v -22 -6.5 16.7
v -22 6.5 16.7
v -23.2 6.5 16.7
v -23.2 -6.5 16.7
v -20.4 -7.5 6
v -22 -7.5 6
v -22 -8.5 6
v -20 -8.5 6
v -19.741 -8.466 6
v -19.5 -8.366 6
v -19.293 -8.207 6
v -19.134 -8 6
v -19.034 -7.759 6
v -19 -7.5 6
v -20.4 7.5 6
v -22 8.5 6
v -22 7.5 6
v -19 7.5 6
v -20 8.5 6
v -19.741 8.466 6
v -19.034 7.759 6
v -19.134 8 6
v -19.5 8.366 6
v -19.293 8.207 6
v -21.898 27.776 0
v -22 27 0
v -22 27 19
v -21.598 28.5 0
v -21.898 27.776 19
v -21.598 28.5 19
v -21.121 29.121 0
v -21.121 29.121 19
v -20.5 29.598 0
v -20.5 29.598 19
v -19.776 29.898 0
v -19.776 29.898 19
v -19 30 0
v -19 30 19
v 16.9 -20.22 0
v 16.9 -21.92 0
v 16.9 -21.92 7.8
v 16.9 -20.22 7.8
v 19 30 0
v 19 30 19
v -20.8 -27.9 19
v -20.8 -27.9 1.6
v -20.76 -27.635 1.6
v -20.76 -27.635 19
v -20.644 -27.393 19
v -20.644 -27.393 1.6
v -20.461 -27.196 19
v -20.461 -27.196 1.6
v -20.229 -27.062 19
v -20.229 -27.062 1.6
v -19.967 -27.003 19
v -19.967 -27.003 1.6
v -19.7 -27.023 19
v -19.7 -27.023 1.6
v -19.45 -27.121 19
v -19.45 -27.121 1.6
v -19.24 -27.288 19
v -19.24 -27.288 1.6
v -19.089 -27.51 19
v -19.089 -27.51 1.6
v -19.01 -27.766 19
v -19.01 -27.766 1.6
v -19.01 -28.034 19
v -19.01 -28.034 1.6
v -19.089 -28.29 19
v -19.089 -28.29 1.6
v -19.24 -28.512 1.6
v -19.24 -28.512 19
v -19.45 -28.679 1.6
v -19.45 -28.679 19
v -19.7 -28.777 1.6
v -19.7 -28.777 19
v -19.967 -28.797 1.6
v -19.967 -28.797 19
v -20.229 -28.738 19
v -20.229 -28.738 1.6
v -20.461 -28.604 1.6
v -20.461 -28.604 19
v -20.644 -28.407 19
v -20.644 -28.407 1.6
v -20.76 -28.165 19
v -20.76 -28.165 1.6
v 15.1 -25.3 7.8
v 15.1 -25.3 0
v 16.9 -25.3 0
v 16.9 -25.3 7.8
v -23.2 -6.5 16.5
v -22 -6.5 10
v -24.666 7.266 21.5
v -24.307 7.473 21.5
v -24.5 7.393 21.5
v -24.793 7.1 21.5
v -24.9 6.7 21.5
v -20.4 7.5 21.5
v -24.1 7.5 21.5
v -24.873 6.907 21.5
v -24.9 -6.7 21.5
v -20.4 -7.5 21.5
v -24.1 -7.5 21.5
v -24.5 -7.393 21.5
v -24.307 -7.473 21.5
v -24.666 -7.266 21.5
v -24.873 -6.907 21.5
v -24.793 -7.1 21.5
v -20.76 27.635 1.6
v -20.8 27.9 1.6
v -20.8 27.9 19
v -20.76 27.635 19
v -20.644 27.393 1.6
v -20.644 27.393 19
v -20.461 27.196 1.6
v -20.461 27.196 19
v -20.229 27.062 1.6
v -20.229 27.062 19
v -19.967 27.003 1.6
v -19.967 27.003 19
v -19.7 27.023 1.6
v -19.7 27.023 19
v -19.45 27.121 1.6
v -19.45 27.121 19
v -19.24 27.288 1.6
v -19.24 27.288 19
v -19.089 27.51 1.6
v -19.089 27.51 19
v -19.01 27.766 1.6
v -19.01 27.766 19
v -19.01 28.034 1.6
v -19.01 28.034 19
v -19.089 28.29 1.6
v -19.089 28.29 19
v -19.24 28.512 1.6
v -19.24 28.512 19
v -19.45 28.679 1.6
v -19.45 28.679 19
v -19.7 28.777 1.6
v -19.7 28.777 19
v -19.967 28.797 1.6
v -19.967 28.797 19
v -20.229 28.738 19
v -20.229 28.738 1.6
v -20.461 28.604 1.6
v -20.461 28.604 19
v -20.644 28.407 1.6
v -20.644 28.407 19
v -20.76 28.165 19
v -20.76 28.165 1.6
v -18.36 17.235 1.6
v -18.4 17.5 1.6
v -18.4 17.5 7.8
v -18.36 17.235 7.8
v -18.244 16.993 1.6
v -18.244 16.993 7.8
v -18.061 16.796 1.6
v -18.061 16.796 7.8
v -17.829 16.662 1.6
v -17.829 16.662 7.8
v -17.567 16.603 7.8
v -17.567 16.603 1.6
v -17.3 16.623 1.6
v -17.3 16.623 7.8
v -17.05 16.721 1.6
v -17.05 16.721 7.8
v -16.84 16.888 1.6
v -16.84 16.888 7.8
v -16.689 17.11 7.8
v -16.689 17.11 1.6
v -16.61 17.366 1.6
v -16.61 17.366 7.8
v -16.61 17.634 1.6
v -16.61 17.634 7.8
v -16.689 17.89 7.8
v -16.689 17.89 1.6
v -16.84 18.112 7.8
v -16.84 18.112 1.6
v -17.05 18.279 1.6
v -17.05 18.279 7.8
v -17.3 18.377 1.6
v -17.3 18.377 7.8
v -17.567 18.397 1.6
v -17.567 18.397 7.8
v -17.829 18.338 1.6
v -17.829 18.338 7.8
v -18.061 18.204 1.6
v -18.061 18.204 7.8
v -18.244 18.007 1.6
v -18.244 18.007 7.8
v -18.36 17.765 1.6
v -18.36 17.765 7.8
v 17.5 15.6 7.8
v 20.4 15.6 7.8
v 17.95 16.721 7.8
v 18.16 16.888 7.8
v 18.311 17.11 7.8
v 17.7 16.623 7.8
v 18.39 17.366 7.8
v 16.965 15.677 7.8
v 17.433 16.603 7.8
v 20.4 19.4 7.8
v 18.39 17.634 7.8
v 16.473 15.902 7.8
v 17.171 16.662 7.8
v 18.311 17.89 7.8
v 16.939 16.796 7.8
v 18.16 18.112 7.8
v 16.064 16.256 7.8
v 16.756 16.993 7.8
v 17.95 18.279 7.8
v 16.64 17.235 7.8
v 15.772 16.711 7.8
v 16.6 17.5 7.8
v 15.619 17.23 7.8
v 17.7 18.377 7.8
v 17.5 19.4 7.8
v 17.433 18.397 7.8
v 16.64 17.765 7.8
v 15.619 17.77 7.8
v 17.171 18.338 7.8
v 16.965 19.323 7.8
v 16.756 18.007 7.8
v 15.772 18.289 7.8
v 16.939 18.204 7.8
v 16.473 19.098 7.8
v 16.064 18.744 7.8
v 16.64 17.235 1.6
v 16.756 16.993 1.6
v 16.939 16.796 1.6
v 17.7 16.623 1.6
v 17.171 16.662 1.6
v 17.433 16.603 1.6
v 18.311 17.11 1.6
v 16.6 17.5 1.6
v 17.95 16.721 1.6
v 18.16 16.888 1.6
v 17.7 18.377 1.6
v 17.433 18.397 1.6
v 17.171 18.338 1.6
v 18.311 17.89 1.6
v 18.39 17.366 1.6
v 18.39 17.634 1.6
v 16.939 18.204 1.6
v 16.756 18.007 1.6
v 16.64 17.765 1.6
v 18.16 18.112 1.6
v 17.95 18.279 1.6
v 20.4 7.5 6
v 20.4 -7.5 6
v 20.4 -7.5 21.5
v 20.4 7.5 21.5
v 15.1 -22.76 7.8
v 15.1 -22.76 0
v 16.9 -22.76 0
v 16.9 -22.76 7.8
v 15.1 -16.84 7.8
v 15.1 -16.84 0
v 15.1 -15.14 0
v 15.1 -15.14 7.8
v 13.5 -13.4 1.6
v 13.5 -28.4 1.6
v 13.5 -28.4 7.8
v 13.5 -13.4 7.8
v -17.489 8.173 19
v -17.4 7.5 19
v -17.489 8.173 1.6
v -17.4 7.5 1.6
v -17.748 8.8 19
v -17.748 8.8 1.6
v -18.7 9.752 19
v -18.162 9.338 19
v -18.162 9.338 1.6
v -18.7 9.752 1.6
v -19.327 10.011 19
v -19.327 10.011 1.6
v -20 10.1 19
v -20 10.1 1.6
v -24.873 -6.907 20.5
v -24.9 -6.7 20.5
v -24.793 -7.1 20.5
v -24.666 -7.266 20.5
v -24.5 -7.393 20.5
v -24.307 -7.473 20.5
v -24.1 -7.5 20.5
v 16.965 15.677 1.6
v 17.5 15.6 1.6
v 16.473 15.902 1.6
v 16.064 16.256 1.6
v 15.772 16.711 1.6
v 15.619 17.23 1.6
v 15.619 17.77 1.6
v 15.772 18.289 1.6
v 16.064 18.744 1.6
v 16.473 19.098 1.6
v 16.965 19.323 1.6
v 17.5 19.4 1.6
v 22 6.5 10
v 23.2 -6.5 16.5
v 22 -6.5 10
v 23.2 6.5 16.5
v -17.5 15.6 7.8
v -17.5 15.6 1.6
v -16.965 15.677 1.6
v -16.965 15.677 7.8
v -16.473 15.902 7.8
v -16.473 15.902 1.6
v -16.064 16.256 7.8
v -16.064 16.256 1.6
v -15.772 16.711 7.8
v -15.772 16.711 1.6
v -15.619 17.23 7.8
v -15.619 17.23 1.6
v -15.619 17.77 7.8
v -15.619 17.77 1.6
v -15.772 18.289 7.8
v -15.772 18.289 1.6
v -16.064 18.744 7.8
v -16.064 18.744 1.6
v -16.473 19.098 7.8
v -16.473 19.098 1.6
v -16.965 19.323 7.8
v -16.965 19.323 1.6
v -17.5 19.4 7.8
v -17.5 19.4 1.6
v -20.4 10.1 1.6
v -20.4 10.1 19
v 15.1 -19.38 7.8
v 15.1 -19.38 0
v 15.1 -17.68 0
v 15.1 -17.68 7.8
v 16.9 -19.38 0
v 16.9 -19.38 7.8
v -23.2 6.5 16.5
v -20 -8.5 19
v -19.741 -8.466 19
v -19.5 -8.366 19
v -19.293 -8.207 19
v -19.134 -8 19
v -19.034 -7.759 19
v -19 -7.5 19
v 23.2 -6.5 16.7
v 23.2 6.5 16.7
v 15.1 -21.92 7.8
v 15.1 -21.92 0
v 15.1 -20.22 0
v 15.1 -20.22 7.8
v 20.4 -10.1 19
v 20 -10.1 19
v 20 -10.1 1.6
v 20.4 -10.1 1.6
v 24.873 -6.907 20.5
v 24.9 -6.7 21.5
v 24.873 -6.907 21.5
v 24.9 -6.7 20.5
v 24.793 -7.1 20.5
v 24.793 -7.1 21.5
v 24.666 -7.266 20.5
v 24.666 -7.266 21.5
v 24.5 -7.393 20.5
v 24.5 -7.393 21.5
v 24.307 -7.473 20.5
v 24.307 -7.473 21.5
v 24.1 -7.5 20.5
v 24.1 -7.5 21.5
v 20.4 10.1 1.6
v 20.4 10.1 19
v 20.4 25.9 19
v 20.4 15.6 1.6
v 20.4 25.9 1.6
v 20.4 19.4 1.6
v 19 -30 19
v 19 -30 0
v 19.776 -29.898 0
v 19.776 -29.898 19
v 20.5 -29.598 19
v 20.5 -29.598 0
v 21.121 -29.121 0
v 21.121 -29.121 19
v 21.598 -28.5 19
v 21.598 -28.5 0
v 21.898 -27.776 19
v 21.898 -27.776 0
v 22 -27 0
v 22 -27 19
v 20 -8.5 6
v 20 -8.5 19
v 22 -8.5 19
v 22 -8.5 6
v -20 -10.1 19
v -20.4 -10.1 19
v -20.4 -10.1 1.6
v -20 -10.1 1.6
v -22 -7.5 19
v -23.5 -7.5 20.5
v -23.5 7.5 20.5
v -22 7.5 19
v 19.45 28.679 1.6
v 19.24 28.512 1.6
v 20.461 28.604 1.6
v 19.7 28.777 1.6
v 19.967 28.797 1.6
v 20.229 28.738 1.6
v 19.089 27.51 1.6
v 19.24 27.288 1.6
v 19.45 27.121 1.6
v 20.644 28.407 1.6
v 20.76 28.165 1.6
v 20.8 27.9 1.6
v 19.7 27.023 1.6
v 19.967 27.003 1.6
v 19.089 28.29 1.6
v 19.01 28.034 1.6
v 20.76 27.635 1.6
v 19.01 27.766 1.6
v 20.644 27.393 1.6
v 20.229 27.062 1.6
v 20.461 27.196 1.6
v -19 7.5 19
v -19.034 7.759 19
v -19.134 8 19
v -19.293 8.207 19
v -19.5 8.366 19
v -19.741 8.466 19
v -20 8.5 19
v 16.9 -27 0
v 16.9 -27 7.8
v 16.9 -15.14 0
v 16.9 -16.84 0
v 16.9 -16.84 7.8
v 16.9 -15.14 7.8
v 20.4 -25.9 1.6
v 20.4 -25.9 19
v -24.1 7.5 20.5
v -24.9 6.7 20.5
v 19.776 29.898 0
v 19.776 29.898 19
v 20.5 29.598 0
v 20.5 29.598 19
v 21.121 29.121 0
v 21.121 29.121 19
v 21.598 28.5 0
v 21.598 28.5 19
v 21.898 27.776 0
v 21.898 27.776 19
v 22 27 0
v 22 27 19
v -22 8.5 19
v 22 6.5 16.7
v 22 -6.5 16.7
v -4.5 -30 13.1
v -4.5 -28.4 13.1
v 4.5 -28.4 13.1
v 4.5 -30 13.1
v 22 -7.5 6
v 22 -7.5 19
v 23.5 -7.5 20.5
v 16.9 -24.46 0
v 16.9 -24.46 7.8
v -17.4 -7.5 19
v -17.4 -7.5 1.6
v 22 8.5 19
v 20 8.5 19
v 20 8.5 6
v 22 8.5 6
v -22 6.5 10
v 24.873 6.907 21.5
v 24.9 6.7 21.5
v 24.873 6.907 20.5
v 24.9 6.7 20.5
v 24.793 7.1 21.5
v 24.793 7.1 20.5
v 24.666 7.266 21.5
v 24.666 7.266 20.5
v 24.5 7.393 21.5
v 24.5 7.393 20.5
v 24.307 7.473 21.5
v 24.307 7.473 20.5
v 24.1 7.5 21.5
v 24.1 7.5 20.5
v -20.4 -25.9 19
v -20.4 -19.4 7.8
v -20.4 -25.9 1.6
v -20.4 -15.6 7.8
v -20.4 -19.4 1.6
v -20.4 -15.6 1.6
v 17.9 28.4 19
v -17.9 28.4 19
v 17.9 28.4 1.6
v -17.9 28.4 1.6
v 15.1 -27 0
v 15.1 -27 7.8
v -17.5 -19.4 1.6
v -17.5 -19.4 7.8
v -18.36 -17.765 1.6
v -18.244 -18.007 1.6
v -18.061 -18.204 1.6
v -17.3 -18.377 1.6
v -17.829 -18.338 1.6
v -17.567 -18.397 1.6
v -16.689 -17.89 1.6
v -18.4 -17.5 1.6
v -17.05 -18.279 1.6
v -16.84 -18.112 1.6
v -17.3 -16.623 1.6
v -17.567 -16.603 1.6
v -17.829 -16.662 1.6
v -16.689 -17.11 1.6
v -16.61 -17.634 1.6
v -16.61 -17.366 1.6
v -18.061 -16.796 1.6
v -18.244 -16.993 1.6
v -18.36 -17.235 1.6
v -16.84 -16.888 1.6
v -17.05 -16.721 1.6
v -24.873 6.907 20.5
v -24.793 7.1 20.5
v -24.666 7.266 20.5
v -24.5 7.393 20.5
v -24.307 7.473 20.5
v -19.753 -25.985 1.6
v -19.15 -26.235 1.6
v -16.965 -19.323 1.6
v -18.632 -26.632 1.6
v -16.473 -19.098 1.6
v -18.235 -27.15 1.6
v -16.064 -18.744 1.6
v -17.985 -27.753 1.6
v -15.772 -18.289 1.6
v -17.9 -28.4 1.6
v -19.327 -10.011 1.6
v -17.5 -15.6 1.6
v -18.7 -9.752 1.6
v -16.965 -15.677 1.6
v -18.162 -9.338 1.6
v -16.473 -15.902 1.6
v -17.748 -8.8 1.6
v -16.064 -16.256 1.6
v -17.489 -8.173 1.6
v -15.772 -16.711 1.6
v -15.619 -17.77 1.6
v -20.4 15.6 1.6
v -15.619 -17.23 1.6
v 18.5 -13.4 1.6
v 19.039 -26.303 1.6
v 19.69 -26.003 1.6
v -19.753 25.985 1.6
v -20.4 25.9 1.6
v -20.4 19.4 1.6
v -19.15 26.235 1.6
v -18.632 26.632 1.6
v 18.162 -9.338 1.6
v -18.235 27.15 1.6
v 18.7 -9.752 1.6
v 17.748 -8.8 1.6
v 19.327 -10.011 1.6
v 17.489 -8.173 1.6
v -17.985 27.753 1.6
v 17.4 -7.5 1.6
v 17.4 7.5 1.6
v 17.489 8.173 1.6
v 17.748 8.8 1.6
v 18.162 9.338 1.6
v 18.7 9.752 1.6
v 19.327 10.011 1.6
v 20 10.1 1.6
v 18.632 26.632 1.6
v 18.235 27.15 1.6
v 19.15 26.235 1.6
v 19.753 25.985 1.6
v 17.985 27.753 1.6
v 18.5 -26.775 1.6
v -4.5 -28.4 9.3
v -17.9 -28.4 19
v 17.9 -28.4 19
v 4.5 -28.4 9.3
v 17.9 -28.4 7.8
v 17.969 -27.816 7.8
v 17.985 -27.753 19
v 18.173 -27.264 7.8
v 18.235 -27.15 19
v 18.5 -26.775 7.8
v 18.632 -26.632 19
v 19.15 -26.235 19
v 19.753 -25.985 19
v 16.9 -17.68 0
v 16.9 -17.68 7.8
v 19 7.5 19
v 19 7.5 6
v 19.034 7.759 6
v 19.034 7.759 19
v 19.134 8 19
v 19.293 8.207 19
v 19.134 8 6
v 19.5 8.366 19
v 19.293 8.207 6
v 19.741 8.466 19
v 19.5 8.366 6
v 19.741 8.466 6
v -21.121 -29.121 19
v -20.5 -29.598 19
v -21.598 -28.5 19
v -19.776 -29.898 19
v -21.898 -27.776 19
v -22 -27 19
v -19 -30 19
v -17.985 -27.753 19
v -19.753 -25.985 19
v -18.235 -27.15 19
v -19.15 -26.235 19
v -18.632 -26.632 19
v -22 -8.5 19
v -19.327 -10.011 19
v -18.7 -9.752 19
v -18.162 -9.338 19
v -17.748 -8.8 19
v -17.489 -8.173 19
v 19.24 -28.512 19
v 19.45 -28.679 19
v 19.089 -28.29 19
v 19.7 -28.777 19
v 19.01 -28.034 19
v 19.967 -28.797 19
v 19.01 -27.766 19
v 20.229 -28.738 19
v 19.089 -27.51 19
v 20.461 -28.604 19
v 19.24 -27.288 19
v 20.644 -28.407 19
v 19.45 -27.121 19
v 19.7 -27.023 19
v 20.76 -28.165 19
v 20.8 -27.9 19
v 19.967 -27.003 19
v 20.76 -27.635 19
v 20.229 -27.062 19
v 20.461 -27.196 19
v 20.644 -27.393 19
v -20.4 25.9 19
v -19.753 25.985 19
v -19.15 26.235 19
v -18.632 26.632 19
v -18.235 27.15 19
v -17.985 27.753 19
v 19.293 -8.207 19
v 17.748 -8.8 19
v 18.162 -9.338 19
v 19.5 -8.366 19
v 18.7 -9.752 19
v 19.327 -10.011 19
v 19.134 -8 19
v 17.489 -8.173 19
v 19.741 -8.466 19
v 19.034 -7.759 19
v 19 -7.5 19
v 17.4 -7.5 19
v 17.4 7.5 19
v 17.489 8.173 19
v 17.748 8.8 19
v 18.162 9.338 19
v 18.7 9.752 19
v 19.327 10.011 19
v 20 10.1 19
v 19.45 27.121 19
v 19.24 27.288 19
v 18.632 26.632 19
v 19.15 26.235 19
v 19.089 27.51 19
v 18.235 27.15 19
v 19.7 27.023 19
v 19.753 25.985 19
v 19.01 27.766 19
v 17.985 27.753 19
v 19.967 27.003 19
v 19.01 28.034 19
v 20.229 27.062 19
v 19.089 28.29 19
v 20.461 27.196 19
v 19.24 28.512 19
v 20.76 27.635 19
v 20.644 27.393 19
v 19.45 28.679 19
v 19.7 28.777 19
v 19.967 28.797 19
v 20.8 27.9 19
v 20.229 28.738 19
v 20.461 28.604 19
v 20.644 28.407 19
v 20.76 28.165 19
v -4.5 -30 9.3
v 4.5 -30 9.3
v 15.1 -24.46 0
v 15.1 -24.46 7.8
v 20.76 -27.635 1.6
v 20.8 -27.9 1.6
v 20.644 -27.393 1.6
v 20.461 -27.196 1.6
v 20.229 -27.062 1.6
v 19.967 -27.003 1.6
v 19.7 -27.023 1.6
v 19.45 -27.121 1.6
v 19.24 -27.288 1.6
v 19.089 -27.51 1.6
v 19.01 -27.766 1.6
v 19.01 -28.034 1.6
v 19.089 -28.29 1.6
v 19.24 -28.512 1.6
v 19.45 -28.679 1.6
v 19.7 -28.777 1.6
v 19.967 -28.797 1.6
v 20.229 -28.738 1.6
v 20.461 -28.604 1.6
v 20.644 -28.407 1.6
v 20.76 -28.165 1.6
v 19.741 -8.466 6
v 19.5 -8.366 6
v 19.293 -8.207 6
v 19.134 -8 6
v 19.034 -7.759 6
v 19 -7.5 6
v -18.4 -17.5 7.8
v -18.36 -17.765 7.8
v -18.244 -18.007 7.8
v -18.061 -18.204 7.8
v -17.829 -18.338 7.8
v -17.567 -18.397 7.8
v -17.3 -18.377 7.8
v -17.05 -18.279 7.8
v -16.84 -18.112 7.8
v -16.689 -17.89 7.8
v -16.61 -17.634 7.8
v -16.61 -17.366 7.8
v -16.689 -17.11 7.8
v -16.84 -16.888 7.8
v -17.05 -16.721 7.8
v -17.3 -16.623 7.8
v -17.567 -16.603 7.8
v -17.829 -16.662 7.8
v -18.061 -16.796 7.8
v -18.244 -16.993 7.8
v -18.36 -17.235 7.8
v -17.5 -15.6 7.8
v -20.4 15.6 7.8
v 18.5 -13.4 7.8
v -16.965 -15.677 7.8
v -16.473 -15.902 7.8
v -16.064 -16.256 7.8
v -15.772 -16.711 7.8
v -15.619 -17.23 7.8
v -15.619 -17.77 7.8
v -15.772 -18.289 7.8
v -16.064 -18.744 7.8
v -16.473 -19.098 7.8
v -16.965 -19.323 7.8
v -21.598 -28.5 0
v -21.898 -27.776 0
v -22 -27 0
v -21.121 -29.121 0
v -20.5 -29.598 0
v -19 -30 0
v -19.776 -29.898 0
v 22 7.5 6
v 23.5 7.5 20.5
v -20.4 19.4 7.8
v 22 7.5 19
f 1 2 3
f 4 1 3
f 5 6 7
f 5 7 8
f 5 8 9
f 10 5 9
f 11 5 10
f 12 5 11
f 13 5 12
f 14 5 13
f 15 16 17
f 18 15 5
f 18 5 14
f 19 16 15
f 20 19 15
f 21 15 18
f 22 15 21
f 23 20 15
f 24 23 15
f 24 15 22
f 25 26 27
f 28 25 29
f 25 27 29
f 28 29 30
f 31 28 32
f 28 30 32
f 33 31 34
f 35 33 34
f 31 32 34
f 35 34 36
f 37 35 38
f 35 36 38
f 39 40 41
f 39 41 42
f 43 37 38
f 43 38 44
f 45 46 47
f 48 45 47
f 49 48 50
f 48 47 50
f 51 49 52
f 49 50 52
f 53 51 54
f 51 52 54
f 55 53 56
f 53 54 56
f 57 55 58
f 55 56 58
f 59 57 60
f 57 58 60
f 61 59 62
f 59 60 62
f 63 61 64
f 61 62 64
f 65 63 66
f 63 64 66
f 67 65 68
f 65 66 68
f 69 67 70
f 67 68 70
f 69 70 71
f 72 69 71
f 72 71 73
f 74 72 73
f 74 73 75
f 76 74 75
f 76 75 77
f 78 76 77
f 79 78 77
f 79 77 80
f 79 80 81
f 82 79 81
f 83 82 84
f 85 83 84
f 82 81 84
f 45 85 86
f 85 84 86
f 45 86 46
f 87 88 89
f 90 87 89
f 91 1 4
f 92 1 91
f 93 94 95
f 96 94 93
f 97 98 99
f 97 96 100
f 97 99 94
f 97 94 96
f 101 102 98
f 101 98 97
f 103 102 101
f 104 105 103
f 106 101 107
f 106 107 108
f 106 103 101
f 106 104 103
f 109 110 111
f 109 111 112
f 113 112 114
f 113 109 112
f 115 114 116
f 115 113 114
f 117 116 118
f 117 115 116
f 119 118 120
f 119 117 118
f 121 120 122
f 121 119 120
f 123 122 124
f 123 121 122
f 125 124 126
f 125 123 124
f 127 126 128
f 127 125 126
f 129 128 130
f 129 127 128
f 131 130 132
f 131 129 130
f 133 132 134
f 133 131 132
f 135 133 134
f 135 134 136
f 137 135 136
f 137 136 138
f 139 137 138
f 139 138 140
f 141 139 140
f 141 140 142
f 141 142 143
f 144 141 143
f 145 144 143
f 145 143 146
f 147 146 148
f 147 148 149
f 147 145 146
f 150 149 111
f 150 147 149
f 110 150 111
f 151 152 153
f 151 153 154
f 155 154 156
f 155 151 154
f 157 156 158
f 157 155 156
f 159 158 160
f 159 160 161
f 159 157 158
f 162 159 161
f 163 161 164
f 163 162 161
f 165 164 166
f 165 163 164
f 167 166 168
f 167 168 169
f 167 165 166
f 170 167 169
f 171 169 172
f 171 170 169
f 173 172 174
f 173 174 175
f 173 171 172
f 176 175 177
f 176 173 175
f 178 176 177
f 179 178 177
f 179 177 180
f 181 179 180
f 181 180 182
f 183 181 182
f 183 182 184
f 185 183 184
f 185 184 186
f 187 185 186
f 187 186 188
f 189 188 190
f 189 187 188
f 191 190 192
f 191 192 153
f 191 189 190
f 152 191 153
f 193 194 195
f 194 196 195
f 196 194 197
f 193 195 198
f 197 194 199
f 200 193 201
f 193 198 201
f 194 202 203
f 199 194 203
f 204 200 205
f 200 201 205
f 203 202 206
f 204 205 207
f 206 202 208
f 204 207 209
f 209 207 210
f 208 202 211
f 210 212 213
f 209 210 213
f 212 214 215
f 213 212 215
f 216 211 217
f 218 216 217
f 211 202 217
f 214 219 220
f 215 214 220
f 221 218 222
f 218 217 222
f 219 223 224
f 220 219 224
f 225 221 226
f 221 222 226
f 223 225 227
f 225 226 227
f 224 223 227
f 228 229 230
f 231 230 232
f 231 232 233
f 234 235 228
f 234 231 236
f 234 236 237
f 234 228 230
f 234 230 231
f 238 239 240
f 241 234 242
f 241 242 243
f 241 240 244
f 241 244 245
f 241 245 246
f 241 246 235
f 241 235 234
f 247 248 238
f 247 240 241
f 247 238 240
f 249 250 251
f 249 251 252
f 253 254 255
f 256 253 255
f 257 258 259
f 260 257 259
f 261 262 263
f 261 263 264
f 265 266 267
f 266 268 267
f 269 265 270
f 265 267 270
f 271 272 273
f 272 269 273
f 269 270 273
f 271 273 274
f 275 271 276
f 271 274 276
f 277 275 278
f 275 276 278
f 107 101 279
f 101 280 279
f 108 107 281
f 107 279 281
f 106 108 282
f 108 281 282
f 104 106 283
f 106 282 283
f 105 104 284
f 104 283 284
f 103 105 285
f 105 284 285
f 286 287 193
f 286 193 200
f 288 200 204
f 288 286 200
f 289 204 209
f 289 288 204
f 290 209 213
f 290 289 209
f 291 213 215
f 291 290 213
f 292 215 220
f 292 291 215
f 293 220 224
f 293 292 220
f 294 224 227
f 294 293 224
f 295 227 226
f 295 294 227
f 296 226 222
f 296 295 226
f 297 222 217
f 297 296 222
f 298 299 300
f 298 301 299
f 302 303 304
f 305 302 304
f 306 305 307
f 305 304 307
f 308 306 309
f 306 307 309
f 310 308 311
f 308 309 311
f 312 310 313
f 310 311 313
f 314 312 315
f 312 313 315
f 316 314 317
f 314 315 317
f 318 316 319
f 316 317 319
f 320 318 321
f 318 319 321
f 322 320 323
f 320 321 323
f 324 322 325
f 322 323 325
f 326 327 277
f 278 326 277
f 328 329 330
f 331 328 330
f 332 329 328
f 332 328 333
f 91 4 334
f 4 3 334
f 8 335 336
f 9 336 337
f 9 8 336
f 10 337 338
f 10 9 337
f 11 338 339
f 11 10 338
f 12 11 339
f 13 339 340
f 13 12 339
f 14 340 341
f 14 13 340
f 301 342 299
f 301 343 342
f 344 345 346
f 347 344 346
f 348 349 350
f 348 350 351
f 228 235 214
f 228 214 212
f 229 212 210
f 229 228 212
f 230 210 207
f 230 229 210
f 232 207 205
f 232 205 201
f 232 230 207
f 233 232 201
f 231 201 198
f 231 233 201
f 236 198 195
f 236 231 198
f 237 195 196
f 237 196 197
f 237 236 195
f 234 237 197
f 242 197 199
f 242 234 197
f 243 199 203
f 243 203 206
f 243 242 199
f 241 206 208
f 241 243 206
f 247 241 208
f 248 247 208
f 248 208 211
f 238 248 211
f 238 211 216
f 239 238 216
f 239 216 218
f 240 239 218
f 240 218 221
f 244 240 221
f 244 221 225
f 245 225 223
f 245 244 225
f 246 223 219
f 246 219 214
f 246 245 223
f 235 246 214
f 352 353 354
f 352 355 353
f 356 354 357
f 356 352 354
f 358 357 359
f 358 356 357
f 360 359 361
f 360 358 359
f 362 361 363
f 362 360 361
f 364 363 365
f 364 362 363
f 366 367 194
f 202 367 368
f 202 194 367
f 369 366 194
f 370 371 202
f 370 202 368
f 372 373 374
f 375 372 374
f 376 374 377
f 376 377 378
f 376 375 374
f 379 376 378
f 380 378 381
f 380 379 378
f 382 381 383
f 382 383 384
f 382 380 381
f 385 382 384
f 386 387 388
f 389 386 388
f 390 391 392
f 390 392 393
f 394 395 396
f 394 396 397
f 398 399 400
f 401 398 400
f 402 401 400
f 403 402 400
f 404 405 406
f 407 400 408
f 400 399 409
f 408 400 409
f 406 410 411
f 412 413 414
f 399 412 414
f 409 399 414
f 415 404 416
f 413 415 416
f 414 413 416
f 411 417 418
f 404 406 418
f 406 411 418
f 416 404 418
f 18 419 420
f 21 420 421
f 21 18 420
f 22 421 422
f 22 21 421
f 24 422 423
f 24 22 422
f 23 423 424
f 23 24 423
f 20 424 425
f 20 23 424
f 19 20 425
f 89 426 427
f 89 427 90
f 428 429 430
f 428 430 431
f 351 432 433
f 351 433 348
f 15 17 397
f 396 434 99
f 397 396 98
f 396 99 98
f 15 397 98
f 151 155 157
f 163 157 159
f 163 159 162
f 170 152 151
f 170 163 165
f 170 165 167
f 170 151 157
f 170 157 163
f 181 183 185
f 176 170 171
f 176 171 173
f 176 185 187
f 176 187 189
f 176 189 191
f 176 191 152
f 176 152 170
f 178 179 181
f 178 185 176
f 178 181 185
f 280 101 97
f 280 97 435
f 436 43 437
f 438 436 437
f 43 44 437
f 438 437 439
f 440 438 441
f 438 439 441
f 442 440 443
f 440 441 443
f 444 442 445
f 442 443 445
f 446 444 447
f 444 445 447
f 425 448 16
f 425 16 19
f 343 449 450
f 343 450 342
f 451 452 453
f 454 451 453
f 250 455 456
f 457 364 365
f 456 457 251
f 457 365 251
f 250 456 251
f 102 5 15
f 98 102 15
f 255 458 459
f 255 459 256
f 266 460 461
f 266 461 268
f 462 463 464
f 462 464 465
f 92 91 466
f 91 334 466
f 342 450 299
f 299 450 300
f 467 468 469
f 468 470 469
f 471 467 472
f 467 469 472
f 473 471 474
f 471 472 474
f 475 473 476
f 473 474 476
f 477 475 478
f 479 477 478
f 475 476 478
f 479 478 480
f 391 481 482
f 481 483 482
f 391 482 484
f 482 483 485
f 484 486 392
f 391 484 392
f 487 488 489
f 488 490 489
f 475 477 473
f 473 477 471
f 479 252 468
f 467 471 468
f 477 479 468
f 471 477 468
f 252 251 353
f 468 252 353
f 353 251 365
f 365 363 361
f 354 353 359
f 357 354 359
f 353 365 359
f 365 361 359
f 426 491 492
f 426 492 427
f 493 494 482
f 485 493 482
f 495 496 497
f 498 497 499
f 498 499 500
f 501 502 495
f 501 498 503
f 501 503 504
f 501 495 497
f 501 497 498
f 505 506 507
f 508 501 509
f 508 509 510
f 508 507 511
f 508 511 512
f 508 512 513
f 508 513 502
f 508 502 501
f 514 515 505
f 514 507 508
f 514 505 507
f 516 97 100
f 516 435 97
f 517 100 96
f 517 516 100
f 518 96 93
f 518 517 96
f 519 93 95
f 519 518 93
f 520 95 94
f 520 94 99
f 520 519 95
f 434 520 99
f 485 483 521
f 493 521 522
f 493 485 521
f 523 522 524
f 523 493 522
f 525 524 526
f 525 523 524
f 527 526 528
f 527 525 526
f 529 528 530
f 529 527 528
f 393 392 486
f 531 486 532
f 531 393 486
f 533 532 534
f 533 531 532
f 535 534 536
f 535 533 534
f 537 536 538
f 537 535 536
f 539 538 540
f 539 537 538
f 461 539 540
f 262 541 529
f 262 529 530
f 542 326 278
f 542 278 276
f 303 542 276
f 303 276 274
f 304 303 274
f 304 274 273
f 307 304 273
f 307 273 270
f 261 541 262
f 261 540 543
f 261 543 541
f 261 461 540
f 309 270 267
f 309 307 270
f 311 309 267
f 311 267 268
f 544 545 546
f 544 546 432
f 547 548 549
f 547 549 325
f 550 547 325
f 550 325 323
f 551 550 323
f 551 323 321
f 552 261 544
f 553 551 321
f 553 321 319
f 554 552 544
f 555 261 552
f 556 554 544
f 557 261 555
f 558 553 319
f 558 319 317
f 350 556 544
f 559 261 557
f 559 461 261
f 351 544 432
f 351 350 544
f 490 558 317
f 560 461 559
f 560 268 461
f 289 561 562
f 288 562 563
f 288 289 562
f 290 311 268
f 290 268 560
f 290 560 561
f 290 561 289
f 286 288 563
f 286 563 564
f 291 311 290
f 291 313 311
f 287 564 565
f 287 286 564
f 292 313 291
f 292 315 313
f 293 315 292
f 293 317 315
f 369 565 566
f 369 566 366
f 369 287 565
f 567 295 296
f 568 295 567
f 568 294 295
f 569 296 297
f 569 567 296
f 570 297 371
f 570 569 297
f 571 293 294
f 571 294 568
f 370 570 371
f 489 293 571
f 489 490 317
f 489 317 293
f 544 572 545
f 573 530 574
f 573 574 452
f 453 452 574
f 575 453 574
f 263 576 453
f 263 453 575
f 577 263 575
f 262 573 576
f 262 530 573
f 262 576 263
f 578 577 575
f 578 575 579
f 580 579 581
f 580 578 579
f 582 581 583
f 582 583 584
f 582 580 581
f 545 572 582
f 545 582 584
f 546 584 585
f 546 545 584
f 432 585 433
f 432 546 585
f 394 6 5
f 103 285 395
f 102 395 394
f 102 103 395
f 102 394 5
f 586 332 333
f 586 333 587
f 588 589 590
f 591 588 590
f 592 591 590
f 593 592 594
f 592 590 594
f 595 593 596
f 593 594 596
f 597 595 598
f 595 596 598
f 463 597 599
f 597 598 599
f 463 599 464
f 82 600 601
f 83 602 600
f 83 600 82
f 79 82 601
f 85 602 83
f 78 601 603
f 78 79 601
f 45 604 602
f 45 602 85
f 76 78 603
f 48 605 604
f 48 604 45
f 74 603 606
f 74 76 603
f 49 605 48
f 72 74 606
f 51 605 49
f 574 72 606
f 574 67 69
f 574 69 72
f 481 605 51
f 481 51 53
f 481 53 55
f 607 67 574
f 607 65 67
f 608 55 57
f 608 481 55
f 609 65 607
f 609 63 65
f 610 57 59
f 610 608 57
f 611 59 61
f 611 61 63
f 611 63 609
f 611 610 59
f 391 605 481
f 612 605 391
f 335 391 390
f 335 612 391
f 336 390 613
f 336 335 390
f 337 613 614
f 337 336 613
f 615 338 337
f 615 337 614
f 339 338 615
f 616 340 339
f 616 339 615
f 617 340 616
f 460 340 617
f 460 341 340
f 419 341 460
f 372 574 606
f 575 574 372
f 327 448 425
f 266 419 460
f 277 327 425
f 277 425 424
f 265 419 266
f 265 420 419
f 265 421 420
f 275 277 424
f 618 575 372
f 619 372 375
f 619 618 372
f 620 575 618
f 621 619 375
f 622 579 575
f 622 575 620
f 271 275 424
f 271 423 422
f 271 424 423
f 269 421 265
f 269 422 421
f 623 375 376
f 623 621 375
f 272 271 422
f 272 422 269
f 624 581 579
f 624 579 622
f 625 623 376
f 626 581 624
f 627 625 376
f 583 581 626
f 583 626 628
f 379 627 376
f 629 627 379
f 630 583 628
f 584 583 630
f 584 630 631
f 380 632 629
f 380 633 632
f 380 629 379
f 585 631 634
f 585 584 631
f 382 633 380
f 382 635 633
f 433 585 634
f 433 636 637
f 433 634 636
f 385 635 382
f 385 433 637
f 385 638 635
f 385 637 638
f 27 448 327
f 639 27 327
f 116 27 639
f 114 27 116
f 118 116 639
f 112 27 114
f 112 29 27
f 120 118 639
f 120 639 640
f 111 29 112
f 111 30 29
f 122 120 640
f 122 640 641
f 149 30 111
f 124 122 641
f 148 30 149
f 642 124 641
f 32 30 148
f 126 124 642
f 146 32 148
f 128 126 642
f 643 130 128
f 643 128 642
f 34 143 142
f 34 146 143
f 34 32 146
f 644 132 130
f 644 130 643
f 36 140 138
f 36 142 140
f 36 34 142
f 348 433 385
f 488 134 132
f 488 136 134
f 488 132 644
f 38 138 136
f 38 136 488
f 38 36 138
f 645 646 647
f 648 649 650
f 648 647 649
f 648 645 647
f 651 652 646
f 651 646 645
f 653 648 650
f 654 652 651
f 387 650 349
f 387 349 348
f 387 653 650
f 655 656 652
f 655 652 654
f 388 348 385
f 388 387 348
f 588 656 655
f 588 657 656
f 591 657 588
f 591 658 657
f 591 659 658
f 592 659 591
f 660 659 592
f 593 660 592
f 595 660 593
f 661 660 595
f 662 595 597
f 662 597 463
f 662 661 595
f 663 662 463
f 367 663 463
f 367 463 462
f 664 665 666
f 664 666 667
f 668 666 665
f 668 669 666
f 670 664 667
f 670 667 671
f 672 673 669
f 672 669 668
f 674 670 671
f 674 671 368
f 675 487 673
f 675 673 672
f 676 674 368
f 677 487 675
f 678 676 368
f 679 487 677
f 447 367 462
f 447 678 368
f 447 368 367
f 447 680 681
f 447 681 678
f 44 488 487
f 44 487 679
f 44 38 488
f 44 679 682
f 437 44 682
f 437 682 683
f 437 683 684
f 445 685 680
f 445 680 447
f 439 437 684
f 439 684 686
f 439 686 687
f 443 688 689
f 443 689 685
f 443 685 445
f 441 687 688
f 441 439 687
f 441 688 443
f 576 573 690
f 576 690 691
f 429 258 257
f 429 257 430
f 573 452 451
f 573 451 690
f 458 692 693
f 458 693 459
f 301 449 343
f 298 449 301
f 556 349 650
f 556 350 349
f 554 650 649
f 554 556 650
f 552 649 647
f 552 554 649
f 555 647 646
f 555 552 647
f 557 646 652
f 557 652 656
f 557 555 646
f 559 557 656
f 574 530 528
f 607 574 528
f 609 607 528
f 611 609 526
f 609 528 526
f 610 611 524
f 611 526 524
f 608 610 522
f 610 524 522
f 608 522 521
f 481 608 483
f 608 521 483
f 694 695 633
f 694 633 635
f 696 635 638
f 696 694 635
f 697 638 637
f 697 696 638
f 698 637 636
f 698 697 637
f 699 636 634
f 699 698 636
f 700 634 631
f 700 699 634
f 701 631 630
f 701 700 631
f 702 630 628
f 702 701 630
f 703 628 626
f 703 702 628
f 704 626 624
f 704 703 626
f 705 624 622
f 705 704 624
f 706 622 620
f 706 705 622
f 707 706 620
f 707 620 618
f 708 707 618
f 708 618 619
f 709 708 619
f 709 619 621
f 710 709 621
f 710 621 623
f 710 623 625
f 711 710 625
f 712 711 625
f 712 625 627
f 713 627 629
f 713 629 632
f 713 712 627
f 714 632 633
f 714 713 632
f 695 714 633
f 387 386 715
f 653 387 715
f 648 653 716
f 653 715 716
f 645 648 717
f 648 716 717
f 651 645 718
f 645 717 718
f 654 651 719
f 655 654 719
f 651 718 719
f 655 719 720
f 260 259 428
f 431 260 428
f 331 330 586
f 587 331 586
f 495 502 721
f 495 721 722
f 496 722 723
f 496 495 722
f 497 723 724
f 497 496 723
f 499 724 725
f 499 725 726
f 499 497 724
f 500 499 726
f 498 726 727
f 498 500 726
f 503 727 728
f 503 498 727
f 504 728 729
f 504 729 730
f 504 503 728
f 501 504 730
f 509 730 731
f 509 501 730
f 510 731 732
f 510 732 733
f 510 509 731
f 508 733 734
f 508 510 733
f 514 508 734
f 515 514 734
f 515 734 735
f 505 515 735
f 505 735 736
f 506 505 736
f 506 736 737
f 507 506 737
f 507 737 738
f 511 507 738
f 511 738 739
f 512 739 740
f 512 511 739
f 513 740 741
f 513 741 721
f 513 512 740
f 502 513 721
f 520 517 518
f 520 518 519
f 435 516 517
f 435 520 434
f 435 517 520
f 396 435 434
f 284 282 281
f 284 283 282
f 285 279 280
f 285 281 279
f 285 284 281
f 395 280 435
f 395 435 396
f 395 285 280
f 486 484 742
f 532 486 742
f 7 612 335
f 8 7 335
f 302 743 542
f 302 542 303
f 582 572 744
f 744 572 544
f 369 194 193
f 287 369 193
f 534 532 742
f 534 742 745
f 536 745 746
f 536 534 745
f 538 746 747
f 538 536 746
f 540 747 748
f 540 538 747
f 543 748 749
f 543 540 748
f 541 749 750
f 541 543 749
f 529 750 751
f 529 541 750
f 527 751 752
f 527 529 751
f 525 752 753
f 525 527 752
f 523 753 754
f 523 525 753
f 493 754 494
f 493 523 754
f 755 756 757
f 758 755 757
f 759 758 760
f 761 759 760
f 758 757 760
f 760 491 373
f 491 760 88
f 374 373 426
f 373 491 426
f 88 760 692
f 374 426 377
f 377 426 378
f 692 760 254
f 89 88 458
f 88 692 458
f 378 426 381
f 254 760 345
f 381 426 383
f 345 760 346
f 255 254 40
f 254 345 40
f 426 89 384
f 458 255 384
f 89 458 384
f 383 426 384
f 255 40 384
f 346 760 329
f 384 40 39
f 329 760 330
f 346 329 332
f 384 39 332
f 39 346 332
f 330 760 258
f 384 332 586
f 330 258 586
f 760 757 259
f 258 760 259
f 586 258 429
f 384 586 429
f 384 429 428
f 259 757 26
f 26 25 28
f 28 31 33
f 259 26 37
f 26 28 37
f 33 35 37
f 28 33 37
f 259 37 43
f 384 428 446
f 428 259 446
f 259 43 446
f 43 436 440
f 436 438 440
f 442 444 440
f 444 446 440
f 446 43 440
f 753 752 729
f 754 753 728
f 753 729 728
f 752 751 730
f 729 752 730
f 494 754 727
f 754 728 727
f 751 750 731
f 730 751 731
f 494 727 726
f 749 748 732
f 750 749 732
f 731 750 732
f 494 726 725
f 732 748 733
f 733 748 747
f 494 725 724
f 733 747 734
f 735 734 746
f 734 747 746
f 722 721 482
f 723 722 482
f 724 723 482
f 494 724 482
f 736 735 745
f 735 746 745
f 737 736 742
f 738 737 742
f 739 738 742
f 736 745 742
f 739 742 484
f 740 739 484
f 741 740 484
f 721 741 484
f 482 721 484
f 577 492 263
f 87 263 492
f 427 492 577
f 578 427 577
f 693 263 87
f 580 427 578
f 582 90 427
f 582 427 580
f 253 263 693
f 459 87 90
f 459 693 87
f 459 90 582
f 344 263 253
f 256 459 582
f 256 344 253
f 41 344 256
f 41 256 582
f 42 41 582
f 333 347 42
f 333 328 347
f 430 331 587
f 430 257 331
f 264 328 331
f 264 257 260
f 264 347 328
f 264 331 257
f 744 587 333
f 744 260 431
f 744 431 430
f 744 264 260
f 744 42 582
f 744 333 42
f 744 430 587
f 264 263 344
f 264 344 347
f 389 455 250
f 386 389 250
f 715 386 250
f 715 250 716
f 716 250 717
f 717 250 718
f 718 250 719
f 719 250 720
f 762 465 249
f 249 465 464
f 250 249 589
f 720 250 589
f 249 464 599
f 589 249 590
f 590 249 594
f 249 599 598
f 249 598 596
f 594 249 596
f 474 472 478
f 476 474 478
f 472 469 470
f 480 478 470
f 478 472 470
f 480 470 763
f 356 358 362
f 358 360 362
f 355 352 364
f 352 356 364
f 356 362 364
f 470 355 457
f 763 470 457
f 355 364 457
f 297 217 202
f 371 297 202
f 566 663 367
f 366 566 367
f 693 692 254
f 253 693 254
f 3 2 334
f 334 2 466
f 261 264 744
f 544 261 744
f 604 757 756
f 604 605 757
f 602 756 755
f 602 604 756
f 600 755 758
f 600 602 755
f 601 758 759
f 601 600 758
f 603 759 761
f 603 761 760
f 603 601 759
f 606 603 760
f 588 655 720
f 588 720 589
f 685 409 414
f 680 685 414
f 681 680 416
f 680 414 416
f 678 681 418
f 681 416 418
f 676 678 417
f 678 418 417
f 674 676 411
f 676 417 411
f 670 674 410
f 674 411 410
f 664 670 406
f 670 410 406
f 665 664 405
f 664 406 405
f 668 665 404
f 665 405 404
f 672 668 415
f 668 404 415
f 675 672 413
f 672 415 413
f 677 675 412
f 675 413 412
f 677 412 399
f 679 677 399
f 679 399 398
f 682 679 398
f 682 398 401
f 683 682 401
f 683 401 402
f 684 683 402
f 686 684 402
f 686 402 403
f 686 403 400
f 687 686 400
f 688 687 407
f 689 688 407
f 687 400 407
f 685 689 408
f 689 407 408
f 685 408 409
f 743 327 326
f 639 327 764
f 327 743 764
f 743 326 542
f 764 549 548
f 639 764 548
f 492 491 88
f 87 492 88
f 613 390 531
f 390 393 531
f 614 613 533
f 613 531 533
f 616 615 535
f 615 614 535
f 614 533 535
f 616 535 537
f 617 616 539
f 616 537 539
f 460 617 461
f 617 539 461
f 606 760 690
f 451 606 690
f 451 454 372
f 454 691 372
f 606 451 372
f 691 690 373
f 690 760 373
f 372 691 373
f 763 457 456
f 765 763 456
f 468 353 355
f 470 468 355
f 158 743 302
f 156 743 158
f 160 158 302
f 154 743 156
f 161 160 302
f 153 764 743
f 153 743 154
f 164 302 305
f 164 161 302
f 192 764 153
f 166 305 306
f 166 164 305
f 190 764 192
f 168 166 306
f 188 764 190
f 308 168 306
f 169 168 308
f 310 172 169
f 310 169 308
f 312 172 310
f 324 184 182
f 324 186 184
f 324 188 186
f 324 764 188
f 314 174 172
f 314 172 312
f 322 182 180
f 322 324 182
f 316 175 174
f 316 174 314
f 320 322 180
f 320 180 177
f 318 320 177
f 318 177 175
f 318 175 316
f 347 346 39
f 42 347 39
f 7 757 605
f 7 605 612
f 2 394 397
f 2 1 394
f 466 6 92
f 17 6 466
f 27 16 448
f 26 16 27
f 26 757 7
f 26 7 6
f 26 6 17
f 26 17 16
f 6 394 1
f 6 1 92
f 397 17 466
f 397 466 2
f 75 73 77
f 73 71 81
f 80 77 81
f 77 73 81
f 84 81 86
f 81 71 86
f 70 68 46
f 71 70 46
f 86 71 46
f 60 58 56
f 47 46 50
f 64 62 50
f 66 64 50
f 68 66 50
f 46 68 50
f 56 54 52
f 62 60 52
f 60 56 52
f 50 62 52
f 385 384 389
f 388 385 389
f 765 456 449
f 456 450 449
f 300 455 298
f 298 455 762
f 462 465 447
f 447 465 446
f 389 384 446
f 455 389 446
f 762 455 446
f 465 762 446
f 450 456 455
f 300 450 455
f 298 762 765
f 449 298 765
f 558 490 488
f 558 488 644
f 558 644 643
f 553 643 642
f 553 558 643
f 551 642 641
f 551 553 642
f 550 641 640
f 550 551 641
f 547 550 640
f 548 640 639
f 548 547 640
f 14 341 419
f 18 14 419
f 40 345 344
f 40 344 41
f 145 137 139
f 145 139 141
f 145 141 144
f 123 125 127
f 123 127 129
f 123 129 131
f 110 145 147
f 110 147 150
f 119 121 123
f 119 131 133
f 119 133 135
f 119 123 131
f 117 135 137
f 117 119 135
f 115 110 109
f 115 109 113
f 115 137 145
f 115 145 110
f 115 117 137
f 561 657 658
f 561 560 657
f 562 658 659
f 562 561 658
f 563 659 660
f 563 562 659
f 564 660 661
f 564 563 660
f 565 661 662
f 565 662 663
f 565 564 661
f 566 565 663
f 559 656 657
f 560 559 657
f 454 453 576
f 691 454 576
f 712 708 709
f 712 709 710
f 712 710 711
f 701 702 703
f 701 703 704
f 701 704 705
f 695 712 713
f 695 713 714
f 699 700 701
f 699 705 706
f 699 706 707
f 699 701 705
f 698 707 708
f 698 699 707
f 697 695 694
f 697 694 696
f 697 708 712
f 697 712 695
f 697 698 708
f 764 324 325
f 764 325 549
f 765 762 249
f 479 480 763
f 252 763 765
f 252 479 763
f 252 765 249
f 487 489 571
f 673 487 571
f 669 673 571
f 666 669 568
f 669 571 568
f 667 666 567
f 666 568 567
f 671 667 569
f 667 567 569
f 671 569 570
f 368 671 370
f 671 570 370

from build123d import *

# Parameters (mm, degrees)
SKETCH_1_W               = 44
SKETCH_1_H               = 60
EXTRUDE_1_DEPTH          = 19
SKETCH_2_W               = 3
SKETCH_2_H               = 17
CUT_EXTRUDE_1_DEPTH      = 42.773197148
FILLET_1_R               = 3
FILLET_2_R               = 1
SHELL_1_T                = -1.6
EXTRUDE_2_DEPTH          = 17.4
SKETCH_3_3_R             = 0.9
CUT_EXTRUDE_2_DEPTH      = 17.4
MIRROR_2_COPY_1_DEPTH    = 17.4
MIRROR_2_COPY_2_SKETCH_R = 0.9
MIRROR_2_COPY_2_DEPTH    = 17.4
SKETCH_4_W               = 5
SKETCH_4_H               = 15
EXTRUDE_3_DEPTH          = 6.2
CUT_EXTRUDE_3_DEPTH      = 42.070183832
CUT_EXTRUDE_3_DEPTH_BACK = 42.070183832
SKETCH_4_4_W             = 1.8
SKETCH_4_4_H             = 1.7
SKETCH_5_R               = 0.9
EXTRUDE_4_DEPTH          = 6.2
SKETCH_6_W               = 9
SKETCH_6_H               = 3.8
CUT_EXTRUDE_4_DEPTH      = 66.234653368
SKETCH_8_W               = 3
SKETCH_8_H               = 17
EXTRUDE_5_DEPTH          = 6
SKETCH_9_W               = 1.6
SKETCH_9_H               = 15
EXTRUDE_6_DEPTH          = 15.5
EXTRUDE_7_DEPTH          = 15
EXTRUDE_8_DEPTH          = 6.5
FILLET_3_R               = 0.8
FILLET_3_OF_MIRROR_3_R   = 0.8


with BuildPart() as part:
    # 草图1 → 凸台-拉伸1 (new body)
    with BuildSketch(Plane.XY):
        Rectangle(SKETCH_1_W, SKETCH_1_H)
    extrude(amount=EXTRUDE_1_DEPTH)

    # 草图2 → 切除-拉伸1 (cut, through all)
    with BuildSketch(Plane.XY.offset(19)):
        with Locations((-20.5, 0)):
            Rectangle(SKETCH_2_W, SKETCH_2_H)
        with Locations((20.5, 0)):
            Rectangle(SKETCH_2_W, SKETCH_2_H)
    extrude(amount=-CUT_EXTRUDE_1_DEPTH, mode=Mode.SUBTRACT)

    # 圆角1
    fillet_1_edges = [part.edges().sort_by_distance(p)[0] for p in [
        (22, -30, 9.5),
        (-22, -30, 9.5),
        (-22, 30, 9.5),
        (22, 30, 9.5),
    ]]
    fillet(fillet_1_edges, radius=FILLET_1_R)

    # 圆角2
    fillet_2_edges = [part.edges().sort_by_distance(p)[0] for p in [
        (-19, 8.5, 9.5),
        (-19, -8.5, 9.5),
        (19, -8.5, 9.5),
        (19, 8.5, 9.5),
    ]]
    fillet(fillet_2_edges, radius=FILLET_2_R)

    # 抽壳1
    shell_1_openings = [part.faces().sort_by_distance(p)[0] for p in [
        (0, 0, 19),
    ]]
    offset(amount=SHELL_1_T, openings=shell_1_openings, kind=Kind.INTERSECTION)

    # 草图3 → 凸台-拉伸2 (add)
    with BuildSketch(Plane.XY.offset(1.6)):
        with BuildLine():
            Line((-20.4, 28.4), (-17.9, 28.4))
            ThreePointArc((-17.9, 28.4), (-18.632233047, 26.632233047), (-20.4, 25.9))
            Line((-20.4, 25.9), (-20.4, 28.4))
        make_face()
    extrude_2 = extrude(amount=EXTRUDE_2_DEPTH)

    # 草图3<3> → 切除-拉伸2 (cut)
    with BuildSketch(Plane.XY.offset(1.6)):
        with Locations(Location((-19.9, 27.9, 0), (0, 0, 180))):
            Circle(SKETCH_3_3_R)
    cut_extrude_2 = extrude(amount=CUT_EXTRUDE_2_DEPTH, mode=Mode.SUBTRACT)

    # 镜向1: 凸台-拉伸2, 切除-拉伸2 across plane
    add(extrude_2.mirror(Plane(origin=(0, 0, 0), x_dir=(0, 0, 1), z_dir=(1, 0, 0))))
    add(cut_extrude_2.mirror(Plane(origin=(0, 0, 0), x_dir=(0, 0, 1), z_dir=(1, 0, 0))), mode=Mode.SUBTRACT)

    # 镜向2: 凸台-拉伸2, 切除-拉伸2 across plane
    add(extrude_2.mirror(Plane.ZX))
    add(cut_extrude_2.mirror(Plane.ZX), mode=Mode.SUBTRACT)

    # 镜向2 copy 1 sketch → 镜向2 copy 1 (add)
    with BuildSketch(Plane(origin=(0, 0, 1.6), x_dir=(-1, 0, 0), z_dir=(0, 0, 1))):
        with BuildLine():
            Line((-20.4, 28.4), (-17.9, 28.4))
            ThreePointArc((-17.9, 28.4), (-18.632233047, 26.632233047), (-20.4, 25.9))
            Line((-20.4, 25.9), (-20.4, 28.4))
        make_face()
    extrude(amount=MIRROR_2_COPY_1_DEPTH)

    # 镜向2 copy 2 sketch → 镜向2 copy 2 (cut)
    with BuildSketch(Plane(origin=(0, 0, 1.6), x_dir=(-1, 0, 0), z_dir=(0, 0, 1))):
        with Locations(Location((-19.9, 27.9, 0), (0, 0, 180))):
            Circle(MIRROR_2_COPY_2_SKETCH_R)
    extrude(amount=MIRROR_2_COPY_2_DEPTH, mode=Mode.SUBTRACT)

    # 草图4 → 凸台-拉伸3 (add)
    with BuildSketch(Plane.XY.offset(1.6)):
        with Locations((16, -20.9)):
            Rectangle(SKETCH_4_W, SKETCH_4_H)
    extrude(amount=EXTRUDE_3_DEPTH)

    # 草图4<4> → 切除-拉伸3 (cut, two sides: drawn at the far end of the back side and taken through both)
    with BuildSketch(Plane.XY.offset(1.6).offset(-CUT_EXTRUDE_3_DEPTH_BACK)):
        with Locations((16, -26.15)):
            Rectangle(SKETCH_4_4_W, SKETCH_4_4_H)
        with Locations((16, -23.61)):
            Rectangle(SKETCH_4_4_W, SKETCH_4_4_H)
        with Locations((16, -21.07)):
            Rectangle(SKETCH_4_4_W, SKETCH_4_4_H)
        with Locations((16, -18.53)):
            Rectangle(SKETCH_4_4_W, SKETCH_4_4_H)
        with Locations((16, -15.99)):
            Rectangle(SKETCH_4_4_W, SKETCH_4_4_H)
    extrude(amount=CUT_EXTRUDE_3_DEPTH + CUT_EXTRUDE_3_DEPTH_BACK, mode=Mode.SUBTRACT)

    # 草图5 → 凸台-拉伸4 (add)
    # profile 1 of 3: a face of its own
    with BuildSketch(Plane.XY.offset(1.6)):
        with BuildLine():
            Line((-17.5, 19.4), (-20.4, 19.4))
            Line((-20.4, 19.4), (-20.4, 15.6))
            Line((-20.4, 15.6), (-17.5, 15.6))
            ThreePointArc((-17.5, 15.6), (-15.6, 17.5), (-17.5, 19.4))
        make_face()
        with Locations(Location((-17.5, 17.5, 0), (0, 0, 180))):
            Circle(SKETCH_5_R, mode=Mode.SUBTRACT)
    # profile 2 of 3: a face of its own
    with BuildSketch(Plane.XY.offset(1.6)):
        with BuildLine():
            Line((20.4, 15.6), (17.5, 15.6))
            ThreePointArc((17.5, 15.6), (15.6, 17.5), (17.5, 19.4))
            Line((17.5, 19.4), (20.4, 19.4))
            Line((20.4, 19.4), (20.4, 15.6))
        make_face()
        with Locations(Location((17.5, 17.5, 0), (0, 0, 180))):
            Circle(SKETCH_5_R, mode=Mode.SUBTRACT)
    # profile 3 of 3: a face of its own
    with BuildSketch(Plane.XY.offset(1.6)):
        with BuildLine():
            Line((-20.4, -15.6), (-17.5, -15.6))
            ThreePointArc((-17.5, -15.6), (-15.6, -17.5), (-17.5, -19.4))
            Line((-17.5, -19.4), (-20.4, -19.4))
            Line((-20.4, -19.4), (-20.4, -15.6))
        make_face()
        with Locations(Location((-17.5, -17.5, 0), (0, 0, 180))):
            Circle(SKETCH_5_R, mode=Mode.SUBTRACT)
    extrude(amount=EXTRUDE_4_DEPTH)

    # 草图6 → 切除-拉伸4 (cut, through all)
    with BuildSketch(Plane(origin=(0, -28.4, 0), x_dir=(1, 0, 0), z_dir=(0, 1, 0))):
        with Locations((0, -11.2)):
            Rectangle(SKETCH_6_W, SKETCH_6_H)
    extrude(amount=-CUT_EXTRUDE_4_DEPTH, mode=Mode.SUBTRACT)

    # 草图8 → 凸台-拉伸5 (add)
    with BuildSketch(Plane(origin=(0, 0, 0), x_dir=(-1, 0, 0), z_dir=(0, 0, -1))):
        with Locations((-20.5, 0)):
            Rectangle(SKETCH_8_W, SKETCH_8_H)
    extrude_5 = extrude(amount=-EXTRUDE_5_DEPTH)

    # 草图9 → 凸台-拉伸6 (add)
    with BuildSketch(Plane.XY.offset(6)):
        with Locations((21.2, 0)):
            Rectangle(SKETCH_9_W, SKETCH_9_H)
    extrude_6 = extrude(amount=EXTRUDE_6_DEPTH)

    # 草图10 → 凸台-拉伸7 (add)
    with BuildSketch(Plane.XZ.offset(7.5)):
        Polygon((22, 21.5), (24.9, 21.5), (24.9, 20.5), (23.5, 20.5), (22, 19), align=None)
    extrude_7 = extrude(amount=-EXTRUDE_7_DEPTH)

    # 草图11 → 凸台-拉伸8 (add, symmetric)
    with BuildSketch(Plane(origin=(0, 0, 0), x_dir=(1, 0, 0), z_dir=(0, 1, 0))):
        Polygon((23.2, -16.5), (22, -10), (22, -16.7), (23.2, -16.7), align=None)
    extrude_8 = extrude(amount=EXTRUDE_8_DEPTH, both=True)

    # 圆角3
    fillet_3_edges = [part.edges().sort_by_distance(p)[0] for p in [
        (24.9, -7.5, 21),
        (24.9, 7.5, 21),
    ]]
    fillet(fillet_3_edges, radius=FILLET_3_R)

    # 镜向3: 凸台-拉伸5, 凸台-拉伸6, 凸台-拉伸7, 凸台-拉伸8 across plane
    add(extrude_5.mirror(Plane(origin=(0, 0, 0), x_dir=(0, 0, 1), z_dir=(1, 0, 0))))
    add(extrude_6.mirror(Plane(origin=(0, 0, 0), x_dir=(0, 0, 1), z_dir=(1, 0, 0))))
    add(extrude_7.mirror(Plane(origin=(0, 0, 0), x_dir=(0, 0, 1), z_dir=(1, 0, 0))))
    add(extrude_8.mirror(Plane(origin=(0, 0, 0), x_dir=(0, 0, 1), z_dir=(1, 0, 0))))

    # 圆角3 of 镜向3
    fillet_3_of_mirror_3_edges = [part.edges().sort_by_distance(p)[0] for p in [
        (-24.9, -7.5, 21),
        (-24.9, 7.5, 21),
    ]]
    fillet(fillet_3_of_mirror_3_edges, radius=FILLET_3_OF_MIRROR_3_R)


solid = part.part
